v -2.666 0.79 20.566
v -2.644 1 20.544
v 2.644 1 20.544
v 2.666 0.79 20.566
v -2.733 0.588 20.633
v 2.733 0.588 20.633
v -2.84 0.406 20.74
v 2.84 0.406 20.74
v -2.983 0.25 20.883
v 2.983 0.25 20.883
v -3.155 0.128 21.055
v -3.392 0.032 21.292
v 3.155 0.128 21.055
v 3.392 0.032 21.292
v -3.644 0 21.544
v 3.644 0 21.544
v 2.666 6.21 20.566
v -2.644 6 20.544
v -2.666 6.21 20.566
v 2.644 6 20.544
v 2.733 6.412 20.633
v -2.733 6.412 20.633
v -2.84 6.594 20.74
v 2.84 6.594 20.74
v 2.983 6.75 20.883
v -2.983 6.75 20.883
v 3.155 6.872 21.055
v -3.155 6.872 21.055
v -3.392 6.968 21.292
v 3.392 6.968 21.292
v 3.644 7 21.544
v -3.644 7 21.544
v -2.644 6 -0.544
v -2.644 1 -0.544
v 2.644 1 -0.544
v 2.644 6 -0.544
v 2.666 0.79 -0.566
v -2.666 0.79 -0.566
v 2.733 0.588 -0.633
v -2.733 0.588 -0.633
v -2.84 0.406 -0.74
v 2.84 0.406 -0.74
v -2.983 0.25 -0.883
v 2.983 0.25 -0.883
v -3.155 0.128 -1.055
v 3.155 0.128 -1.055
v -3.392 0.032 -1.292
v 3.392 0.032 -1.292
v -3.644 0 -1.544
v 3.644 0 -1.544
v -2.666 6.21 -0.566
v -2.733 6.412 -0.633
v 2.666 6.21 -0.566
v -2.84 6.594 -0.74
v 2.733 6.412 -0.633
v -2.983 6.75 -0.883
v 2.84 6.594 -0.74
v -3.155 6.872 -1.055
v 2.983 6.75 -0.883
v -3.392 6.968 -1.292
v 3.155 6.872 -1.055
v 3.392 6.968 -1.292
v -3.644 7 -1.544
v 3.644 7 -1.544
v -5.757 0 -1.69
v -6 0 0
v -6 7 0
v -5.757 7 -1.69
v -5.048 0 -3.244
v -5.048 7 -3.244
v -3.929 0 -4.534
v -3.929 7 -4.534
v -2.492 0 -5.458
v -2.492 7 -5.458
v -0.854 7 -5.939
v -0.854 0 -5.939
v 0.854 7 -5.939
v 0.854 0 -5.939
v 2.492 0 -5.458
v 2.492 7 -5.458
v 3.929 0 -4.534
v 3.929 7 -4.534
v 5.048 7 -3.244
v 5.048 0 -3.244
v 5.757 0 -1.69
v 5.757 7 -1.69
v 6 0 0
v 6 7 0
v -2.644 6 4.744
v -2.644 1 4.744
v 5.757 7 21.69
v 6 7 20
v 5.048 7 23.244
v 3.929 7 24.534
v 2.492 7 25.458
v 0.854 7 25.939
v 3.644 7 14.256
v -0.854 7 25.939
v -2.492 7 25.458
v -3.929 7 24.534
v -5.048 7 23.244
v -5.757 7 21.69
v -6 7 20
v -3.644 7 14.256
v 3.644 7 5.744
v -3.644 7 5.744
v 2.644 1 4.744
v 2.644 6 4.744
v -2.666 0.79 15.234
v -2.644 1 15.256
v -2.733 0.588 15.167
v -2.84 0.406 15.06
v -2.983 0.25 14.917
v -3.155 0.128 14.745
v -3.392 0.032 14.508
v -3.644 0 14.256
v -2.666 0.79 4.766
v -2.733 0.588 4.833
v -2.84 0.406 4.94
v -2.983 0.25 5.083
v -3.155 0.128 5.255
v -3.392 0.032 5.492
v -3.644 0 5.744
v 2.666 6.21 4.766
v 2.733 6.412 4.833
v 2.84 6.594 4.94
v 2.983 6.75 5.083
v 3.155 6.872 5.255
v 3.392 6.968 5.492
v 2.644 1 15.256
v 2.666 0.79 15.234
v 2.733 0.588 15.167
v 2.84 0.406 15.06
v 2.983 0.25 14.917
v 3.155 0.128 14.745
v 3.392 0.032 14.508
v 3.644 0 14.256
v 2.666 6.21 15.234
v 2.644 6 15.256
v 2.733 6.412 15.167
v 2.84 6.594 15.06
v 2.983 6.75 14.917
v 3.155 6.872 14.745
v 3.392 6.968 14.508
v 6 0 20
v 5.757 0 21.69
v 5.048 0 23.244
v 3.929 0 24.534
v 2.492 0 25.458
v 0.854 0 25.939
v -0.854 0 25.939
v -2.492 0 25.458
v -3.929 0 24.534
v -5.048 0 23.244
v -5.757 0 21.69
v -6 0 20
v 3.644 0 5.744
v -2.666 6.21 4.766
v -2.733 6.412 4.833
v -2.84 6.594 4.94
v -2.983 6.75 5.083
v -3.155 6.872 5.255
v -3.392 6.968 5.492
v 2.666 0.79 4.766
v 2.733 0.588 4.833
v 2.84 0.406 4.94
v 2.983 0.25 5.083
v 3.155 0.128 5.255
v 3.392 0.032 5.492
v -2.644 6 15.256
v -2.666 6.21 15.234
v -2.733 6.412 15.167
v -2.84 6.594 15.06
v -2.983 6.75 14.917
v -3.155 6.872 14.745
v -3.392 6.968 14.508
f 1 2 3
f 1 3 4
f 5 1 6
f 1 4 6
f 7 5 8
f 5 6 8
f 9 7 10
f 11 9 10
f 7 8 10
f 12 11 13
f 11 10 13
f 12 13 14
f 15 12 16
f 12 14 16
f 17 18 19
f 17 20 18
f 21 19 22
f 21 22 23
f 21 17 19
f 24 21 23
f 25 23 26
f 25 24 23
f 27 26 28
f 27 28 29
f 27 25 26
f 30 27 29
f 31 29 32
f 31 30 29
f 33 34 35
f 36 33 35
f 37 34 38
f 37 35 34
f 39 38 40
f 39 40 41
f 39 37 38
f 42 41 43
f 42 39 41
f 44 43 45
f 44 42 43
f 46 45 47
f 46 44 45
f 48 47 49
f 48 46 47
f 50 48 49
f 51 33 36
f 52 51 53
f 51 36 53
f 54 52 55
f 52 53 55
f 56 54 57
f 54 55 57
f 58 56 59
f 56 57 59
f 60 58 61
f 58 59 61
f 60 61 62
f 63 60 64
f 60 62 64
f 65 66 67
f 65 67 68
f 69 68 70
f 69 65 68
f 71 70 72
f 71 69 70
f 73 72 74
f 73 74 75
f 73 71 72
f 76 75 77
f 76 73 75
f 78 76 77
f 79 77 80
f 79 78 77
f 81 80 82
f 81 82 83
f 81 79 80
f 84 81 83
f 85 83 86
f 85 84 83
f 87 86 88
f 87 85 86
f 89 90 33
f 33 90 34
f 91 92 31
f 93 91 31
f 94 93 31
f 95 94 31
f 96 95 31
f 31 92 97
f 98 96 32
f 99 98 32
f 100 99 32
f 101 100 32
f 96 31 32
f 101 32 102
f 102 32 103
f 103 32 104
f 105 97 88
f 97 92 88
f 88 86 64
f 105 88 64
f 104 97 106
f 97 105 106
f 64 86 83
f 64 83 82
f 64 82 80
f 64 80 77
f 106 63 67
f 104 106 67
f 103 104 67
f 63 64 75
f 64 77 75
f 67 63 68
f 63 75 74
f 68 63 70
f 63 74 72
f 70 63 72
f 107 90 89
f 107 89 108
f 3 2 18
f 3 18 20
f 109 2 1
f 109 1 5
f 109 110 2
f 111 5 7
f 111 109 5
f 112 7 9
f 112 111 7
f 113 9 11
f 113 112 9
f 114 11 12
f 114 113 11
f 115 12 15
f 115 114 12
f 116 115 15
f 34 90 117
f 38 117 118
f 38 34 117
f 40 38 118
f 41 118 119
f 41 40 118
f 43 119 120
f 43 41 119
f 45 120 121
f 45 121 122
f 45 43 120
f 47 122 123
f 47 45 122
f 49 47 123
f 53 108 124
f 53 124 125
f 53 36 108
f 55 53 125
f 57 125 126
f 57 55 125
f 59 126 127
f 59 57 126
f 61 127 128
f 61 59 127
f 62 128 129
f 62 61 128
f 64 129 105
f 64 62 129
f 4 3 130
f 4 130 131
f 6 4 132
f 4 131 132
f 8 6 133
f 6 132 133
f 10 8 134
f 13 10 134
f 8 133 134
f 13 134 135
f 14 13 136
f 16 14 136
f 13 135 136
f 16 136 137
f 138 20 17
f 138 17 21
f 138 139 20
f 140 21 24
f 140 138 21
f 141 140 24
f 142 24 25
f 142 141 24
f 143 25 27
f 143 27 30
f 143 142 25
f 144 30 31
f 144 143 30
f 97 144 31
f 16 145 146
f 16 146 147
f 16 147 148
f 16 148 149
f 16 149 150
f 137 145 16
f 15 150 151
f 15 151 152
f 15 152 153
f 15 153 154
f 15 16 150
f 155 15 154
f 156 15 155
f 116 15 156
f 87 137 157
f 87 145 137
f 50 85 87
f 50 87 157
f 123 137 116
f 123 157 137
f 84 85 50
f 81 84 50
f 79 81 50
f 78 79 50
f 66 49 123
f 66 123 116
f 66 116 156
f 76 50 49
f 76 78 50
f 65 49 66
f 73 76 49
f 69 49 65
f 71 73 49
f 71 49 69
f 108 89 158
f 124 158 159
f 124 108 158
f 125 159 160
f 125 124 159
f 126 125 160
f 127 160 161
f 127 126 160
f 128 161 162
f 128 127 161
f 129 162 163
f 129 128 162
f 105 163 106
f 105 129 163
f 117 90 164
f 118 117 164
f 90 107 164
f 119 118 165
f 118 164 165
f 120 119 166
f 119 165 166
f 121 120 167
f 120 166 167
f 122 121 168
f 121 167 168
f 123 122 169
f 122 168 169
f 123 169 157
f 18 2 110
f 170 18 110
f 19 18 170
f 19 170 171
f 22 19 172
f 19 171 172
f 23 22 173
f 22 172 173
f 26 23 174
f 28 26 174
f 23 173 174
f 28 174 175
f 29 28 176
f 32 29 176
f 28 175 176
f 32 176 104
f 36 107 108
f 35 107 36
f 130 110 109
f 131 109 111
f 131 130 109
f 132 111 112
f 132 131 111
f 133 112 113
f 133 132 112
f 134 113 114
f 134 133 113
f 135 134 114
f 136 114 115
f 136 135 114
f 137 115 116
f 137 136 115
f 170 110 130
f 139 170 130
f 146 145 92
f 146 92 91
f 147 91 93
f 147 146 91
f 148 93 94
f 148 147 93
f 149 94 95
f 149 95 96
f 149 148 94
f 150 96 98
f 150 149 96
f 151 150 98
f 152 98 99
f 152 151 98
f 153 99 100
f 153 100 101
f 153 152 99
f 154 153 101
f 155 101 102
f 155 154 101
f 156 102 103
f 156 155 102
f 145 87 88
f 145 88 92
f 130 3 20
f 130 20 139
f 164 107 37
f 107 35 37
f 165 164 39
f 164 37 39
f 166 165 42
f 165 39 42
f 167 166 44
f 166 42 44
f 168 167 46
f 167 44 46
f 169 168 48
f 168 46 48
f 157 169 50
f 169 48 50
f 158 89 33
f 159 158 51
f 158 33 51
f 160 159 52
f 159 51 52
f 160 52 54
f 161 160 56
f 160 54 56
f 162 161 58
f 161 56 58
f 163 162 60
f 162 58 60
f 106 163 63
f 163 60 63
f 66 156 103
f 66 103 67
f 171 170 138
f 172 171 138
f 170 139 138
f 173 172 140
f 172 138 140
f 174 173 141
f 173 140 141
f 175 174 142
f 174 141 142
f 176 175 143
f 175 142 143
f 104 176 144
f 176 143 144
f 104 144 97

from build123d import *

# Parameters (mm, degrees)
SKETCH4_W           = 5.288
SKETCH4_H           = 5.288
BOSS_EXTRUDE1_DEPTH = 7
FILLET1_R           = 1


with BuildPart() as part:
    # Sketch4 → Boss-Extrude1 (new body)
    with BuildSketch(Plane(origin=(0, 0, 0), x_dir=(1, 0, 0), z_dir=(0, 1, 0))):
        with BuildLine():
            Line((6, 0), (6, -20))
            ThreePointArc((6, -20), (0, -26), (-6, -20))
            Line((-6, -20), (-6, 0))
            ThreePointArc((-6, 0), (0, 6), (6, 0))
        make_face()
        with Locations((0, -17.9)):
            Rectangle(SKETCH4_W, SKETCH4_H, mode=Mode.SUBTRACT)
        with Locations((0, -2.1)):
            Rectangle(SKETCH4_W, SKETCH4_H, mode=Mode.SUBTRACT)
    extrude(amount=BOSS_EXTRUDE1_DEPTH)

    # Fillet1
    fillet1_edges = [part.edges().sort_by_distance(p)[0] for p in [
        (2.644, 0, 2.1),
        (0, 0, -0.544),
        (-2.644, 0, 2.1),
        (0, 0, 4.744),
        (2.644, 7, 2.1),
        (0, 7, -0.544),
        (-2.644, 7, 2.1),
        (0, 7, 4.744),
        (-2.644, 0, 17.9),
        (0, 0, 20.544),
        (2.644, 0, 17.9),
        (0, 0, 15.256),
        (-2.644, 7, 17.9),
        (0, 7, 20.544),
        (2.644, 7, 17.9),
        (0, 7, 15.256),
    ]]
    fillet(fillet1_edges, radius=FILLET1_R)


solid = part.part
